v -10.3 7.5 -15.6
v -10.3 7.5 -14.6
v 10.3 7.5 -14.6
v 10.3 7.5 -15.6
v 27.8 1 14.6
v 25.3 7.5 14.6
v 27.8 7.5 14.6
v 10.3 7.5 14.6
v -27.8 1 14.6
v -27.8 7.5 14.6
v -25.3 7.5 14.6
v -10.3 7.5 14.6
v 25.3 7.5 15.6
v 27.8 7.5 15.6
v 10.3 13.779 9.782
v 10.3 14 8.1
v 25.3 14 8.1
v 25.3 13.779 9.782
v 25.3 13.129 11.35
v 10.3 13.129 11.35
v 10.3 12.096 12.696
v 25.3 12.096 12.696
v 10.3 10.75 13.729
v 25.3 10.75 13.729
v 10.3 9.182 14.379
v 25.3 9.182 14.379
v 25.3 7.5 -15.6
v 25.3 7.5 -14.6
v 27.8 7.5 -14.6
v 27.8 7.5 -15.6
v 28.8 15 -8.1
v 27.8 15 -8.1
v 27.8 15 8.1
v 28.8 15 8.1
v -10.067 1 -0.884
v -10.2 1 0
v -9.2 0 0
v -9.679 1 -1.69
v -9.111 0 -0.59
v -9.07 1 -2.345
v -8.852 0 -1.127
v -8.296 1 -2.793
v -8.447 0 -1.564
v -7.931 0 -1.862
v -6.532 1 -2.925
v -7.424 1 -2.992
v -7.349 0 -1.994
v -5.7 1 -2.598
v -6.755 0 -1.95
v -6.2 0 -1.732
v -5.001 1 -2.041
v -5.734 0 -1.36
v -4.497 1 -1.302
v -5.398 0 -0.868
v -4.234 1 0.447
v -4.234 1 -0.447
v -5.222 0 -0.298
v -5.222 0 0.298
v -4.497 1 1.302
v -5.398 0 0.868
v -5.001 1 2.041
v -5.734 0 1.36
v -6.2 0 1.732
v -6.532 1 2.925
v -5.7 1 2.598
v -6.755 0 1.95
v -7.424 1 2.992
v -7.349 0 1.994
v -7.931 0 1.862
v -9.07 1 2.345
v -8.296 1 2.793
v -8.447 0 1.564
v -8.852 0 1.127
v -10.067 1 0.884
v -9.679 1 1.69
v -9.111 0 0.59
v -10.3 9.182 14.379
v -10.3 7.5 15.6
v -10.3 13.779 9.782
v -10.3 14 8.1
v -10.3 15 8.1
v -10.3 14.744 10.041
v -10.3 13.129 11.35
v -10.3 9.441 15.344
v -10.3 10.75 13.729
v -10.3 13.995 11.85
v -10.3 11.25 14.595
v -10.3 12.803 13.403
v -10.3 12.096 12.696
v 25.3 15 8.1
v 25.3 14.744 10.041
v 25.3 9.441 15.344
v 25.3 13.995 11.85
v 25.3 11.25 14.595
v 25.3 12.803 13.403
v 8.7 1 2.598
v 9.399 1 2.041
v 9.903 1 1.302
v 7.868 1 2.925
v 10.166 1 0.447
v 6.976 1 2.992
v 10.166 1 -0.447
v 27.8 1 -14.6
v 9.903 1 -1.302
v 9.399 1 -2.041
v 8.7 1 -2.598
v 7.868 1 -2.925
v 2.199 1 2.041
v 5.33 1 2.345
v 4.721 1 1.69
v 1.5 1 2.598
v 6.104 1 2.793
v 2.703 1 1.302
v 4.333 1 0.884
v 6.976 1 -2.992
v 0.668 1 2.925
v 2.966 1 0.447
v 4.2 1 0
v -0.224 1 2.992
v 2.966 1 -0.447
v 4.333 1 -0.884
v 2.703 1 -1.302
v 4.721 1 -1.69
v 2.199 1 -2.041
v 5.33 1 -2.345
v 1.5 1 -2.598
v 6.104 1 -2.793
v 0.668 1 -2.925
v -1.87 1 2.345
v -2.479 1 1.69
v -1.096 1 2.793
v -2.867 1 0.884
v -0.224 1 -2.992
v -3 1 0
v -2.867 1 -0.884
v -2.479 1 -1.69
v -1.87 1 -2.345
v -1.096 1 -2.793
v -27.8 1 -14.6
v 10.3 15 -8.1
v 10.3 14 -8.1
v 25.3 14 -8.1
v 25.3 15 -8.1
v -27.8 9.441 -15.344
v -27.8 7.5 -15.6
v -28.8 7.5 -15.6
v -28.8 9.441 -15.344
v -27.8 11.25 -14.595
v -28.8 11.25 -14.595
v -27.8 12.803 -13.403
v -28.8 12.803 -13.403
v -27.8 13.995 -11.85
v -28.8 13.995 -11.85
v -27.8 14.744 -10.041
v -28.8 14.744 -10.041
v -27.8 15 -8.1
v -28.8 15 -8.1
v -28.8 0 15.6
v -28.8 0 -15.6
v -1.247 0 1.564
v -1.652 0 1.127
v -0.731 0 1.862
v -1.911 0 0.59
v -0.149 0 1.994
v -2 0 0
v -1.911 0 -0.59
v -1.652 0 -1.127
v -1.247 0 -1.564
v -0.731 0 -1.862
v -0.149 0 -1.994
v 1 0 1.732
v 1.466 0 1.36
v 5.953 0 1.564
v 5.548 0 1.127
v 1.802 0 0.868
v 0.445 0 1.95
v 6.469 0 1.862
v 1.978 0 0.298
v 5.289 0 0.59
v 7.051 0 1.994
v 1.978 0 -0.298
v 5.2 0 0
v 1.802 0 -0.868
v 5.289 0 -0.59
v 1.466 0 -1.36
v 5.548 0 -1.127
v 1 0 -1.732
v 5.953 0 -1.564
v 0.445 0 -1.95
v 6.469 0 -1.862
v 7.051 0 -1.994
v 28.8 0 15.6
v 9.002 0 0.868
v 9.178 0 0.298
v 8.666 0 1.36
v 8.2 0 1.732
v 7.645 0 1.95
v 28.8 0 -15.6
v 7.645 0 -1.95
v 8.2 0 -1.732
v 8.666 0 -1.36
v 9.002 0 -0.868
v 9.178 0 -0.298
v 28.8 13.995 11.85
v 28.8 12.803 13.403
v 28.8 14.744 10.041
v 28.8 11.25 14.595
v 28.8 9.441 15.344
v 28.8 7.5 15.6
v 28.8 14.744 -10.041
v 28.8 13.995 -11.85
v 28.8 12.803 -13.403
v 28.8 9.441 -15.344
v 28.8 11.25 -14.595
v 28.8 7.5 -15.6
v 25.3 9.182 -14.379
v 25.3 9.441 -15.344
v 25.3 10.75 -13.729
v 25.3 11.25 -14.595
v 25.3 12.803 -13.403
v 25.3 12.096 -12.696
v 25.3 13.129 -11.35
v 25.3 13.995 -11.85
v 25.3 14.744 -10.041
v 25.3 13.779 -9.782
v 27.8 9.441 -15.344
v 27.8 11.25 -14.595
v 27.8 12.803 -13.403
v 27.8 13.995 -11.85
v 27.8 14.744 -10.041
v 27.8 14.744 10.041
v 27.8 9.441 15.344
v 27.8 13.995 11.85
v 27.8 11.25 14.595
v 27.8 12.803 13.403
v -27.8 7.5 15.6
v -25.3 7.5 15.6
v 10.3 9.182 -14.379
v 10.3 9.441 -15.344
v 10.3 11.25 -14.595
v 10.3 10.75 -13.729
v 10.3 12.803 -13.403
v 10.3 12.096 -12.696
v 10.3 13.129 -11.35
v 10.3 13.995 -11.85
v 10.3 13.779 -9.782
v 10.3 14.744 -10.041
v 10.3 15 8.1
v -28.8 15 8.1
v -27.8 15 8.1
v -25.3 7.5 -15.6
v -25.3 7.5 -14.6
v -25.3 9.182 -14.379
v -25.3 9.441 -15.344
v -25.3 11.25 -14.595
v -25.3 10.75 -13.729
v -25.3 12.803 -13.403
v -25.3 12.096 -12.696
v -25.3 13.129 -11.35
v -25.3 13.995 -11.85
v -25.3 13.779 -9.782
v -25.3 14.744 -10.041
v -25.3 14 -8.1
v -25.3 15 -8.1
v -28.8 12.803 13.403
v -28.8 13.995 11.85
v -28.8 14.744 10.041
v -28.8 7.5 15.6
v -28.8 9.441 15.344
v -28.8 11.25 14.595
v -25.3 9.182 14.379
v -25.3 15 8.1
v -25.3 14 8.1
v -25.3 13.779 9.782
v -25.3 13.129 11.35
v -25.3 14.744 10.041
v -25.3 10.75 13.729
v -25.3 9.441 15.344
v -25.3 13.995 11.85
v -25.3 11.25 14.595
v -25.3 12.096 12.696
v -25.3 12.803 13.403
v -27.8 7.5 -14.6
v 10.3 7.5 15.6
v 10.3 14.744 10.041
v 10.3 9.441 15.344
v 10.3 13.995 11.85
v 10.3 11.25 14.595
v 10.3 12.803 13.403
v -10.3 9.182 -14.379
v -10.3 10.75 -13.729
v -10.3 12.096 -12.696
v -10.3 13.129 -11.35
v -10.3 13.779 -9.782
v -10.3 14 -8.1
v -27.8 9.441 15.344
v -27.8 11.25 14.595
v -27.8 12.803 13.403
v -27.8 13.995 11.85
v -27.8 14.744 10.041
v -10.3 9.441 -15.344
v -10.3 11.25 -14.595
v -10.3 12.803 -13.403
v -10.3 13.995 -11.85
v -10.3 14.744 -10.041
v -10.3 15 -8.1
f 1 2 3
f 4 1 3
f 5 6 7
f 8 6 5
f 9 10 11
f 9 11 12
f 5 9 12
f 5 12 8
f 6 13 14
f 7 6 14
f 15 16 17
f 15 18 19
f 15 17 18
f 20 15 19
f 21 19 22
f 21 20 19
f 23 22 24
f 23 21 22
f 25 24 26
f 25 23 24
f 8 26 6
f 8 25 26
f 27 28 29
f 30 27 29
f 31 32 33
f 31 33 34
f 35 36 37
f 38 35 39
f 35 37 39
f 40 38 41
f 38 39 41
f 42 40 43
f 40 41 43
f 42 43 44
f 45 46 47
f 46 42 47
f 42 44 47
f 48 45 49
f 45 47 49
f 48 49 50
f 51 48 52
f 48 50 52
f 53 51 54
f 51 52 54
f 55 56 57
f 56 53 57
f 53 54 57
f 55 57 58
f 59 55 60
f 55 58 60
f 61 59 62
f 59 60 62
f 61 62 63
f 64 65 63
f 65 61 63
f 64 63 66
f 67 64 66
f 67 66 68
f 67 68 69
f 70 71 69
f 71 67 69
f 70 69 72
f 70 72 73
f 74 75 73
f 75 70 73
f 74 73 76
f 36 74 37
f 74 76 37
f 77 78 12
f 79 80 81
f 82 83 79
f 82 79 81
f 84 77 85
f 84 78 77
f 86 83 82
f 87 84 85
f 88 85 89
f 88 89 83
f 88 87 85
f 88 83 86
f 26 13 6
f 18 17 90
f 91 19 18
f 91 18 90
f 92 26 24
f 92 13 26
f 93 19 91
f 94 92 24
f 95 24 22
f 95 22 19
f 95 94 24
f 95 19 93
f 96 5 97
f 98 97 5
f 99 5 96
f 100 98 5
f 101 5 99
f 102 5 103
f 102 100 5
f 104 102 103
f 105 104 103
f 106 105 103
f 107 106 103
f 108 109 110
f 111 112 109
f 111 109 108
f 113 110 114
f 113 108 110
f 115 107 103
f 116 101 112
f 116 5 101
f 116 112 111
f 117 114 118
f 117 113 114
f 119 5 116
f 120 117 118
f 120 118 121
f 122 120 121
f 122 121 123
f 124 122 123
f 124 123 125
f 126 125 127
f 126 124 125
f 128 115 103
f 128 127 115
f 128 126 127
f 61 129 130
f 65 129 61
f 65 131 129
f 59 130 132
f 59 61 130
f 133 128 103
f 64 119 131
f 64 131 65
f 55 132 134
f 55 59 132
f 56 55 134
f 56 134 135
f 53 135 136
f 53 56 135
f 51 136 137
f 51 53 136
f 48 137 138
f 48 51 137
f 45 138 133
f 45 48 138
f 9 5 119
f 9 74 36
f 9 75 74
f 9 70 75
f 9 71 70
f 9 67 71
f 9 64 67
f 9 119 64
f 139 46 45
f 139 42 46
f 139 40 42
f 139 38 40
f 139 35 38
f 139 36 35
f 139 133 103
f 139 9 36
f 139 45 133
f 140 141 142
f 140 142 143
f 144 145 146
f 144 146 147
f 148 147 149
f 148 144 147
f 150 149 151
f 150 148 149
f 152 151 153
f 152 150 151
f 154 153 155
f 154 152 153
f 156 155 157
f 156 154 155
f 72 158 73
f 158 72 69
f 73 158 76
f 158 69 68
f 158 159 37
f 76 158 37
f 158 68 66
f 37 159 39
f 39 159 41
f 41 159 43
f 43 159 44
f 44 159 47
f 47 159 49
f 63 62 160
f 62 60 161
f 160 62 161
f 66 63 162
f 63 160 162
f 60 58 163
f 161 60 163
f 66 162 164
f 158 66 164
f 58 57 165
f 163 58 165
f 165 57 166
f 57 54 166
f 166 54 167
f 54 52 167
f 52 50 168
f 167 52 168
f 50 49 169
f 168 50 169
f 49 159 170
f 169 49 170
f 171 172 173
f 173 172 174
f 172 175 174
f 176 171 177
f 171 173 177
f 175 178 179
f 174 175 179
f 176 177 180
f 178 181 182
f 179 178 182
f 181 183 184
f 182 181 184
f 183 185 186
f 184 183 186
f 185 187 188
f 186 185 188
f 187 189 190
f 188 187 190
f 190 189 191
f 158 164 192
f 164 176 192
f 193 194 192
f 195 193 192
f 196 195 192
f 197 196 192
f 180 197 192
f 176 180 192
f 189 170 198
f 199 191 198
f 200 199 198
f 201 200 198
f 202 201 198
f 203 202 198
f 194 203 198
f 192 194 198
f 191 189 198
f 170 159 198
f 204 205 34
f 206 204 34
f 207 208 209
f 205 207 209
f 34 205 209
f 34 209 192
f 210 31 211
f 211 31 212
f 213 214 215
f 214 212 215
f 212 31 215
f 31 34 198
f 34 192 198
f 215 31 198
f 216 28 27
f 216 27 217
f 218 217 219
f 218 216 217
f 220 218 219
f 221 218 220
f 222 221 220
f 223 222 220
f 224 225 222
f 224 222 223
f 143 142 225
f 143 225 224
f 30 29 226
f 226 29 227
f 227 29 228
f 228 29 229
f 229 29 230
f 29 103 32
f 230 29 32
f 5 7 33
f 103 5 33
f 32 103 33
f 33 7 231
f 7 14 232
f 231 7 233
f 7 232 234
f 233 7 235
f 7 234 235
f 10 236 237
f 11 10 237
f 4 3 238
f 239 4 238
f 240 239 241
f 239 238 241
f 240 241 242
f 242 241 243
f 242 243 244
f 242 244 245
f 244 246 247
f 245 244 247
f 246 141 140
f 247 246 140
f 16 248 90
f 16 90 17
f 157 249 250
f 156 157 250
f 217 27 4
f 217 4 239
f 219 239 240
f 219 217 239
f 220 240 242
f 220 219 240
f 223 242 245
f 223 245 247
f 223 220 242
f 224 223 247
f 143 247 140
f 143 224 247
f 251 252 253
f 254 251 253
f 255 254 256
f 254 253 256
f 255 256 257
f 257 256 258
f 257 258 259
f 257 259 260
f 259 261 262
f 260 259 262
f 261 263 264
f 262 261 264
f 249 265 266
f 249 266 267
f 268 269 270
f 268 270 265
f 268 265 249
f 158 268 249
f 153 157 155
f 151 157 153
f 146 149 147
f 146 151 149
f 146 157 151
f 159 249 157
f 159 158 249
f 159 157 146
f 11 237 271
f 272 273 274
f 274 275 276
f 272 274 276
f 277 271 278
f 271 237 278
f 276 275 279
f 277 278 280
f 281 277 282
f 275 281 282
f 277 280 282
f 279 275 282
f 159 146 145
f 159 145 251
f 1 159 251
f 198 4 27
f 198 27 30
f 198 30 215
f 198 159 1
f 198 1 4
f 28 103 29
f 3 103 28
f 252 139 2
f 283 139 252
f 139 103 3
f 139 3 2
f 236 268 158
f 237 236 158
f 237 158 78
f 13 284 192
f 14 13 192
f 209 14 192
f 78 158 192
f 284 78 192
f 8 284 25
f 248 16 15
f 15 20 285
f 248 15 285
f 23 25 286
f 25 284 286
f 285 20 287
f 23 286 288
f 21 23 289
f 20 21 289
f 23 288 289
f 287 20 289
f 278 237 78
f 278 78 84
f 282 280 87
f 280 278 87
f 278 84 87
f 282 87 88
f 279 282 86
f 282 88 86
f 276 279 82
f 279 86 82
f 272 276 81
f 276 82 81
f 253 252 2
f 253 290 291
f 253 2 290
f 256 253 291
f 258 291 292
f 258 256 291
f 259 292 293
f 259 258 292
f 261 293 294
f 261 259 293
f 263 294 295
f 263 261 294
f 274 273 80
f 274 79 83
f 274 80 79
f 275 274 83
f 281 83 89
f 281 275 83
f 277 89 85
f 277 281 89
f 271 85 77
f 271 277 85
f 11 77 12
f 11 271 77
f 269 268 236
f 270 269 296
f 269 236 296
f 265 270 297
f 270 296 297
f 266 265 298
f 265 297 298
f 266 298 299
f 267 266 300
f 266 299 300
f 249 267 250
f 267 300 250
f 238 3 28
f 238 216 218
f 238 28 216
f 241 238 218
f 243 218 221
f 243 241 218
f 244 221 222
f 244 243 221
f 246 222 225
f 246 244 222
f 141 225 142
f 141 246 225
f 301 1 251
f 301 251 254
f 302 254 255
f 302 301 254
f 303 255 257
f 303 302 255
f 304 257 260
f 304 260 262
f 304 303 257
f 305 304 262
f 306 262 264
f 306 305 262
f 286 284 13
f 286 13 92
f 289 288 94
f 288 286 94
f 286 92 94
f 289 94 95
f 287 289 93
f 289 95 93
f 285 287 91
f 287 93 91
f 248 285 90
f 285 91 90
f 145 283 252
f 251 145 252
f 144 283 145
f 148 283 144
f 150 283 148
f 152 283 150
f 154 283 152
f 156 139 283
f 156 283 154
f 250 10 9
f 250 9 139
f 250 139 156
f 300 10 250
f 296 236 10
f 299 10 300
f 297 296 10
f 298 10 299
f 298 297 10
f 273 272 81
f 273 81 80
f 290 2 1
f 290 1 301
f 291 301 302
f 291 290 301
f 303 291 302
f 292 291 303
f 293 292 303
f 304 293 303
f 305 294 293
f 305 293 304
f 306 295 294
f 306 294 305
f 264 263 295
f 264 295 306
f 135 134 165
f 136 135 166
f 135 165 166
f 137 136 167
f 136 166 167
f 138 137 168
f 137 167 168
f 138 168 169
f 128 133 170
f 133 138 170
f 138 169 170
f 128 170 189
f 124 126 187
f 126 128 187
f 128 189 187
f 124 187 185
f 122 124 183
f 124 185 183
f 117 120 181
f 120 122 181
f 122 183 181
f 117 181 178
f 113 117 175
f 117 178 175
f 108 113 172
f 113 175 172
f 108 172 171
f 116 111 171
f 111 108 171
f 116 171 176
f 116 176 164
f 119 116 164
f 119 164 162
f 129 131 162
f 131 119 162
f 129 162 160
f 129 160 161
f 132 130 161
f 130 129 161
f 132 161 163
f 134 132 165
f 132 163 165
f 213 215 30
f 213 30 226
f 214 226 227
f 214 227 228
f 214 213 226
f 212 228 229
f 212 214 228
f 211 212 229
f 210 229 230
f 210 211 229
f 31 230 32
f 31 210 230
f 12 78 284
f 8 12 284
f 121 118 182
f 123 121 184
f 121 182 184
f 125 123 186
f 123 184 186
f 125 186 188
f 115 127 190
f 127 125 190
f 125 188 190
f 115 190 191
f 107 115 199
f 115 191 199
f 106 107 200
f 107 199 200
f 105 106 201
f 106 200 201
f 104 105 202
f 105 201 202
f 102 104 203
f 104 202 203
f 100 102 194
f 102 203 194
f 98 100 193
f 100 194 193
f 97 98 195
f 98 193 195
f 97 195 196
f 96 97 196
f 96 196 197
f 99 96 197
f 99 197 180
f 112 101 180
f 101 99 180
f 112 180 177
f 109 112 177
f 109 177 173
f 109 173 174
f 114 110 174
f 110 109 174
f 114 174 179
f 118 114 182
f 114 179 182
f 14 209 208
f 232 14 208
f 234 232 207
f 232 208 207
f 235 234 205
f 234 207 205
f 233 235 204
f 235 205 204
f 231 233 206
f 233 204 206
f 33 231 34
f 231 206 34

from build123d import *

# Parameters (mm, degrees)
SKETCH1_W                   = 57.6
SKETCH1_H                   = 31.2
BOSS_EXTRUDE1_DEPTH         = 15
FILLET1_R                   = 7.5
SHELL1_START                = -27.8
SHELL1_DEPTH                = 55.6
SKETCH4_W                   = 2.5
SKETCH4_H                   = 7.5
SKETCH4_W_2                 = 20.6
CUT_EXTRUDE1_DEPTH          = 46.03198863
SKETCH5_R                   = 1.4
CUT_EXTRUDE2_DEPTH          = 15
M3_TAPPED_HOLE1_D           = 2.5
M3_TAPPED_HOLE1_DEPTH       = 16
M3_TAPPED_HOLE1_CSINK_D     = 6
M3_TAPPED_HOLE1_CSINK_ANGLE = 90
M3_TAPPED_HOLE1_TIP         = 0.751075774


# Read off the part's stored shape, not the designer's step: Shell1
with BuildPart() as part:
    # Sketch1 → Boss-Extrude1 (new body)
    with BuildSketch(Plane(origin=(0, 0, 0), x_dir=(1, 0, 0), z_dir=(0, 1, 0))):
        Rectangle(SKETCH1_W, SKETCH1_H)
    extrude(amount=BOSS_EXTRUDE1_DEPTH)

    # Fillet1
    fillet1_edges = [part.edges().sort_by_distance(p)[0] for p in [
        (0, 15, 15.6),
        (0, 15, -15.6),
    ]]
    fillet(fillet1_edges, radius=FILLET1_R)

    # Shell1 outline → Shell1 (cut)
    with BuildSketch(Plane.YZ.offset(SHELL1_START)):
        with BuildLine():
            Line((15, -8.1), (15, 8.1))
            Line((15, 8.1), (14, 8.1))
            ThreePointArc((14, 8.1), (12.096194078, 12.696194078), (7.5, 14.6))
            Line((7.5, 14.6), (1, 14.6))
            Line((1, 14.6), (1, -14.6))
            Line((1, -14.6), (7.5, -14.6))
            ThreePointArc((7.5, -14.6), (12.096194078, -12.696194078), (14, -8.1))
            Line((14, -8.1), (15, -8.1))
        make_face()
    extrude(amount=SHELL1_DEPTH, mode=Mode.SUBTRACT)

    # Sketch4 → Cut-Extrude1 (cut, through all)
    with BuildSketch(Plane.XY.offset(15.6)):
        with Locations((-26.55, 11.25)):
            Rectangle(SKETCH4_W, SKETCH4_H)
        with Locations((0, 11.25)):
            Rectangle(SKETCH4_W_2, SKETCH4_H)
        with Locations((26.55, 11.25)):
            Rectangle(SKETCH4_W, SKETCH4_H)
    extrude(amount=-CUT_EXTRUDE1_DEPTH, mode=Mode.SUBTRACT)

    # Sketch5 → Cut-Extrude2 (cut)
    with BuildSketch(Plane(origin=(0, 1, 0), x_dir=(1, 0, 0), z_dir=(0, 1, 0))):
        with Locations(Location((0, 0, 0), (0, 0, 270))):
            Circle(SKETCH5_R)
        with Locations(Location((7.2, 0, 0), (0, 0, 270))):
            Circle(SKETCH5_R)
        with Locations(Location((-7.2, 0, 0), (0, 0, 270))):
            Circle(SKETCH5_R)
    extrude(amount=-CUT_EXTRUDE2_DEPTH, mode=Mode.SUBTRACT)

    # M3 Tapped Hole1
    with Locations(Plane(origin=(0, 1, 31.4), x_dir=(1, 0, 0), z_dir=(0, 1, 0))):
        with Locations((7.2, 31.4), (0, 31.4), (-7.2, 31.4)):
            CounterSinkHole(M3_TAPPED_HOLE1_D / 2, M3_TAPPED_HOLE1_CSINK_D / 2, depth=M3_TAPPED_HOLE1_DEPTH, counter_sink_angle=M3_TAPPED_HOLE1_CSINK_ANGLE)
            with Locations((0, 0, -(M3_TAPPED_HOLE1_DEPTH + M3_TAPPED_HOLE1_TIP / 2))):  # 118° drill point
                Cone(0, M3_TAPPED_HOLE1_D / 2, M3_TAPPED_HOLE1_TIP, mode=Mode.SUBTRACT)


solid = part.part
